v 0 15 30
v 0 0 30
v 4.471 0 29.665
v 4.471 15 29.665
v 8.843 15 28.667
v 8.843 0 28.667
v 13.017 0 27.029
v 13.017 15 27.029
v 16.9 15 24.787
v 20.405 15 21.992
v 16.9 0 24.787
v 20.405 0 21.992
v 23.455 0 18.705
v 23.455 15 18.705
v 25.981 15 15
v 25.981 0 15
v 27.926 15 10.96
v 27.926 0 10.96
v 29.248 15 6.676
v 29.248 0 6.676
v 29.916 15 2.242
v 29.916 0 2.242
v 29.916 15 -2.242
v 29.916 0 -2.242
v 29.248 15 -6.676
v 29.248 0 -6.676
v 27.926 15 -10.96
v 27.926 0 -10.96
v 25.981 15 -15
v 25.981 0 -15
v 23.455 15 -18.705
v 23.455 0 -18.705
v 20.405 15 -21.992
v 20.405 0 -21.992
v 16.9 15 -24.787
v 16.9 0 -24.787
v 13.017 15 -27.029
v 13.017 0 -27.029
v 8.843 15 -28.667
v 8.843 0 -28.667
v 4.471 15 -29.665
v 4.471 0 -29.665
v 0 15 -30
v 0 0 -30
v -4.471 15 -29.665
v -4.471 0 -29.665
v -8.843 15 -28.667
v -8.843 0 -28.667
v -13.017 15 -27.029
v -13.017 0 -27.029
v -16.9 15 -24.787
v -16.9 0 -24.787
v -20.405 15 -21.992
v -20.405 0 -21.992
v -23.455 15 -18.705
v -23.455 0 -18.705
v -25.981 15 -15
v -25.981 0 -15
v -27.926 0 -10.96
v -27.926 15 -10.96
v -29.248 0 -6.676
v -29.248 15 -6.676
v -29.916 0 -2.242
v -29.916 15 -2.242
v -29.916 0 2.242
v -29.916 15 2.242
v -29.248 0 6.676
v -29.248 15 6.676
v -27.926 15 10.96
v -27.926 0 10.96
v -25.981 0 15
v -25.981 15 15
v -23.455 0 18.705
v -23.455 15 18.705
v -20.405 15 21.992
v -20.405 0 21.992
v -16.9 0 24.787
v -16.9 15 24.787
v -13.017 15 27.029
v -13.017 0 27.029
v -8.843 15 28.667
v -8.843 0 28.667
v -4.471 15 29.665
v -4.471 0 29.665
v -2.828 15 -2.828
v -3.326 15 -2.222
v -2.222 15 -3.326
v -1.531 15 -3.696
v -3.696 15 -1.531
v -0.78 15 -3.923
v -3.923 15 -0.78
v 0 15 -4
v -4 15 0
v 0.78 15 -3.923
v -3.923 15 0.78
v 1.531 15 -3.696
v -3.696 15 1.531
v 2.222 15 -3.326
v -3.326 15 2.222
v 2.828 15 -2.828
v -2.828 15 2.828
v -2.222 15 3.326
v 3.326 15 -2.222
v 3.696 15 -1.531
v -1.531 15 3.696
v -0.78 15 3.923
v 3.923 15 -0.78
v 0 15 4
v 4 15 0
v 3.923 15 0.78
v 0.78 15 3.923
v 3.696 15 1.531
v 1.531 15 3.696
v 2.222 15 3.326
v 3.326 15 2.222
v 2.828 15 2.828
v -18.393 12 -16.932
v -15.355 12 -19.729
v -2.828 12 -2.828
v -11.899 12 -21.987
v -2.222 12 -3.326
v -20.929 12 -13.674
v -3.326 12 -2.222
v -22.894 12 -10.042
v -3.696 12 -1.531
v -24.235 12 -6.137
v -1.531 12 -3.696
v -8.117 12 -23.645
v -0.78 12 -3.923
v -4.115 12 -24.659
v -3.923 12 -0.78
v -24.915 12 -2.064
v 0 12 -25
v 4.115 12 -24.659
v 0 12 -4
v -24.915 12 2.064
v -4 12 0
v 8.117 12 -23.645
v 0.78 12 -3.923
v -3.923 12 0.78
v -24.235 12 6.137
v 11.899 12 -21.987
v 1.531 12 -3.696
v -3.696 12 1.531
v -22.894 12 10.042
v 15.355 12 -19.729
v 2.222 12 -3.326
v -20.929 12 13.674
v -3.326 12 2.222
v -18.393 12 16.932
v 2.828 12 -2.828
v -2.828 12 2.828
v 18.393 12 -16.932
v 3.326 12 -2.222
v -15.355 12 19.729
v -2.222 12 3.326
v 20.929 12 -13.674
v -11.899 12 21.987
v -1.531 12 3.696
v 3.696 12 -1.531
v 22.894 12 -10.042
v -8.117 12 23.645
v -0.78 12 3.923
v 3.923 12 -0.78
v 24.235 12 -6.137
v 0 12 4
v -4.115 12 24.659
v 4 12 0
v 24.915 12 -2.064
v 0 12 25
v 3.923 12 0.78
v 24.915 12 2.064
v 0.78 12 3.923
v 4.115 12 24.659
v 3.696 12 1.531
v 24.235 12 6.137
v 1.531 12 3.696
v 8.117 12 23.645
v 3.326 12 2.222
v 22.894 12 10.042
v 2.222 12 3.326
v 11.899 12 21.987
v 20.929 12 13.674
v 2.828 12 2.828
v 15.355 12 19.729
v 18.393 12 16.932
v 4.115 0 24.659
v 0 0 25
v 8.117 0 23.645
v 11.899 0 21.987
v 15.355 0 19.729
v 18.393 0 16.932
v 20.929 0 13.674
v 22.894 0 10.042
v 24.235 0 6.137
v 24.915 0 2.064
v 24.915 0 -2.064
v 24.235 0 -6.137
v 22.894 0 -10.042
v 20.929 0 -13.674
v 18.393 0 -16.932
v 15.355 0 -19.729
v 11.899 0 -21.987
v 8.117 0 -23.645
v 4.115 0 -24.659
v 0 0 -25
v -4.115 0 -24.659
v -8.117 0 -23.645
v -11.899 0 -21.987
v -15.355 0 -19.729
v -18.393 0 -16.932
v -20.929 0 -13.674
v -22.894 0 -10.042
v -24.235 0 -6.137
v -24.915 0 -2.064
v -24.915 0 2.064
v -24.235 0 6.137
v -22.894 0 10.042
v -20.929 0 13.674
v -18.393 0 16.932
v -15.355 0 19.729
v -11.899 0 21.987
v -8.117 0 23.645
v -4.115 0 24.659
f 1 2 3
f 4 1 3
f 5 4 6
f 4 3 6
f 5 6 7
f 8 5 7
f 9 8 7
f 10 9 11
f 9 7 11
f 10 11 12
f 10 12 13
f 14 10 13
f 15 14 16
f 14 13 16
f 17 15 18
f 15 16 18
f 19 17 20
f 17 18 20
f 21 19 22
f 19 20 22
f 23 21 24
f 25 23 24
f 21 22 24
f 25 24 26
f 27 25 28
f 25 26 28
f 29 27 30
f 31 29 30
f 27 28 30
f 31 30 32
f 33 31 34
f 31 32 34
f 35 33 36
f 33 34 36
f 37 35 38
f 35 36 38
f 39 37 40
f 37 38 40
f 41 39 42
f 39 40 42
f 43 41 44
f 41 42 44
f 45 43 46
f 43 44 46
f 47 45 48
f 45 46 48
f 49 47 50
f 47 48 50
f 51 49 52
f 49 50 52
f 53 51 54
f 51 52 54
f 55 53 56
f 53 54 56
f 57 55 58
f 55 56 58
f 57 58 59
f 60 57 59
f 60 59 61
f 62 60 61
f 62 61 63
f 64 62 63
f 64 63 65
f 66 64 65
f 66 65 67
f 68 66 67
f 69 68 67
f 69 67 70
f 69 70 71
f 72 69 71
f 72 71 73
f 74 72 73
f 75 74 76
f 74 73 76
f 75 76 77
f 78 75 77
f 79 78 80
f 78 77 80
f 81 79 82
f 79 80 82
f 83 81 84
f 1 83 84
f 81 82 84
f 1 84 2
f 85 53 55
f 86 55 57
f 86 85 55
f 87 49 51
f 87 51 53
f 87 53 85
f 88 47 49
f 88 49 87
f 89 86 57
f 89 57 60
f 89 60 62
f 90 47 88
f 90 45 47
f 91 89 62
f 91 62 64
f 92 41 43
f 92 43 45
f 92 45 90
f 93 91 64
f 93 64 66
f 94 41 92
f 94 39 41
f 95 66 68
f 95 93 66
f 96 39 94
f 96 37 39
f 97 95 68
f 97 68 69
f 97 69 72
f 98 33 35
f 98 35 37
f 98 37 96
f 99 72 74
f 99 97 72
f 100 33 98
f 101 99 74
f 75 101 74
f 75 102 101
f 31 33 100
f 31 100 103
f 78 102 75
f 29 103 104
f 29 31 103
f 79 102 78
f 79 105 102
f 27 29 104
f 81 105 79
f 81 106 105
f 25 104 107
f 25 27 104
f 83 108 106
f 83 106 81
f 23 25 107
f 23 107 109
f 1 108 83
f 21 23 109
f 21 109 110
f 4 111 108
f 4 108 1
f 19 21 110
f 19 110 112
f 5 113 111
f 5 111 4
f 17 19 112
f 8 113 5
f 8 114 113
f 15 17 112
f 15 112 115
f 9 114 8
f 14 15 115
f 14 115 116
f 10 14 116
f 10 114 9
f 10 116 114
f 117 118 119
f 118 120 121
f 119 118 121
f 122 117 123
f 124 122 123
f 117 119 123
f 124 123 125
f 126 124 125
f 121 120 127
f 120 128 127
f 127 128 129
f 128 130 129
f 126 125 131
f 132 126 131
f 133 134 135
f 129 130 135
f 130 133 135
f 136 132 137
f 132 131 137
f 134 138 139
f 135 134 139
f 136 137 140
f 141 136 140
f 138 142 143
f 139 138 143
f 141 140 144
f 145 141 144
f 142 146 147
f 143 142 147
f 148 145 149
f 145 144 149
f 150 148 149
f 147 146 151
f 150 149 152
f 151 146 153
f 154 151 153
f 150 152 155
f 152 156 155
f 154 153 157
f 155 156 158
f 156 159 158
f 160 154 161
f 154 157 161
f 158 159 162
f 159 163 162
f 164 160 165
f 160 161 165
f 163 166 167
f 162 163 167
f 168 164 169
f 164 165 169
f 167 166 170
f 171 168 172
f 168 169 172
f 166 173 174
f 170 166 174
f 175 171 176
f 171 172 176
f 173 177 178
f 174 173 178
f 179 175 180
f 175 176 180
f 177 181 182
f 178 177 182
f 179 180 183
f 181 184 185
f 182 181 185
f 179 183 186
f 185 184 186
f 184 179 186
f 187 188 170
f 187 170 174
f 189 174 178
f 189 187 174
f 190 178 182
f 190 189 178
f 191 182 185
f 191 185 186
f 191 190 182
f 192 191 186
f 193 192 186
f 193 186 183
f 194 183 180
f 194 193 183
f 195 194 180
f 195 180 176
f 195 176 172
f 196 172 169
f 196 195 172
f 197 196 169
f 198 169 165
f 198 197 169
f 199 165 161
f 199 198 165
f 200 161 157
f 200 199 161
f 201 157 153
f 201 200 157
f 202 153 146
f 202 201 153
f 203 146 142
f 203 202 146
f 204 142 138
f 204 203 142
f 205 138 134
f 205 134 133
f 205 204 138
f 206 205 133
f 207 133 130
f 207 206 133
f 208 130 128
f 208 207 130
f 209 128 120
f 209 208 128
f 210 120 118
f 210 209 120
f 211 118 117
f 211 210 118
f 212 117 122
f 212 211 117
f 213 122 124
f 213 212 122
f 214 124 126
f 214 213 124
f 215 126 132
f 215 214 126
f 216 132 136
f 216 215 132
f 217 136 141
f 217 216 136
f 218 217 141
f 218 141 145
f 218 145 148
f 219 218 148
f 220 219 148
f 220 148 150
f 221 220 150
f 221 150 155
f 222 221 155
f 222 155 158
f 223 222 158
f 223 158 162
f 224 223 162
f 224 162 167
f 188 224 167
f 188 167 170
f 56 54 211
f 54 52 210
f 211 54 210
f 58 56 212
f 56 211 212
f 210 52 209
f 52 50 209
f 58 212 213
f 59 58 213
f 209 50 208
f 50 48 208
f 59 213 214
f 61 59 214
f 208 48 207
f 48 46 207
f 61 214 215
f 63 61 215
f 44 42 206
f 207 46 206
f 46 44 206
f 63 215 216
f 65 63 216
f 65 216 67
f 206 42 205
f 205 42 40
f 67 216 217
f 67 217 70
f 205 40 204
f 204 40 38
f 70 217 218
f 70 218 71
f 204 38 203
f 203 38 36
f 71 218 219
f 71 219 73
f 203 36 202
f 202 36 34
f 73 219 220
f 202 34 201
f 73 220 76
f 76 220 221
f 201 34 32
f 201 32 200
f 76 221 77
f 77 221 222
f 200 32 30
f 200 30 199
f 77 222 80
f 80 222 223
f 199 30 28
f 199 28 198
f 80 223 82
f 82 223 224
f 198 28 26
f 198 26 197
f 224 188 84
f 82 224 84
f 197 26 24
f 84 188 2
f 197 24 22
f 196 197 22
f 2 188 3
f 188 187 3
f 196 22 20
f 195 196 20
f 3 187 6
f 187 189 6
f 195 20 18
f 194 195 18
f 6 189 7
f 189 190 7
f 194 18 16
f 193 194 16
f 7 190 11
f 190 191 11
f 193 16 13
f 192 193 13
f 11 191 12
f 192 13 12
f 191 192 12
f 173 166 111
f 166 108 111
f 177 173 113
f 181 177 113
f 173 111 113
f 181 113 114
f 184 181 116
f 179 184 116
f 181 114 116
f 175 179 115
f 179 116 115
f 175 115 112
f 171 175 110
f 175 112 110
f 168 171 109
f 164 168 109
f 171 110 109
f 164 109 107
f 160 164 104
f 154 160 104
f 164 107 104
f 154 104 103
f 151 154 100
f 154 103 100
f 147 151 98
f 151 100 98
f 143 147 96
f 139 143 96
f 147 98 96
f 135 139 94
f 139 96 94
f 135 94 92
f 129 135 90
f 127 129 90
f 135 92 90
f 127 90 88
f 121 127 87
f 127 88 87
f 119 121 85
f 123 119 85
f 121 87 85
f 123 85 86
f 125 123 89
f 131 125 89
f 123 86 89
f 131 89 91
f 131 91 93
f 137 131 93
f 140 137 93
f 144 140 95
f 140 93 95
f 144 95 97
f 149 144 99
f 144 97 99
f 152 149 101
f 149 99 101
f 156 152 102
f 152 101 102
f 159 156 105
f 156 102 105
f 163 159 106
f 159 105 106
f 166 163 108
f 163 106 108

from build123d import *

# Parameters (mm, degrees)
SKETCH_1_R          = 30
EXTRUDE_1_DEPTH     = 15
SKETCH_2_R          = 25
CUT_EXTRUDE_1_DEPTH = 12
SKETCH_3_R          = 4
CUT_EXTRUDE_2_DEPTH = 61


with BuildPart() as part:
    # 草图1 → 凸台-拉伸1 (new body)
    with BuildSketch(Plane(origin=(0, 0, 0), x_dir=(1, 0, 0), z_dir=(0, 1, 0))):
        with Locations(Location((0, 0, 0), (0, 0, 270))):
            Circle(SKETCH_1_R)
    extrude(amount=EXTRUDE_1_DEPTH)

    # 草图2 → 切除-拉伸1 (cut)
    with BuildSketch(Plane(origin=(0, 0, 0), x_dir=(1, 0, 0), z_dir=(0, 1, 0))):
        with Locations(Location((0, 0, 0), (0, 0, 270))):
            Circle(SKETCH_2_R)
    extrude(amount=CUT_EXTRUDE_1_DEPTH, mode=Mode.SUBTRACT)

    # 草图3 → 切除-拉伸2 (cut, symmetric)
    with BuildSketch(Plane(origin=(0, 15, 0), x_dir=(1, 0, 0), z_dir=(0, 1, 0))):
        with Locations(Location((0, 0, 0), (0, 0, 270))):
            Circle(SKETCH_3_R)
    extrude(amount=CUT_EXTRUDE_2_DEPTH, both=True, mode=Mode.SUBTRACT)


solid = part.part
